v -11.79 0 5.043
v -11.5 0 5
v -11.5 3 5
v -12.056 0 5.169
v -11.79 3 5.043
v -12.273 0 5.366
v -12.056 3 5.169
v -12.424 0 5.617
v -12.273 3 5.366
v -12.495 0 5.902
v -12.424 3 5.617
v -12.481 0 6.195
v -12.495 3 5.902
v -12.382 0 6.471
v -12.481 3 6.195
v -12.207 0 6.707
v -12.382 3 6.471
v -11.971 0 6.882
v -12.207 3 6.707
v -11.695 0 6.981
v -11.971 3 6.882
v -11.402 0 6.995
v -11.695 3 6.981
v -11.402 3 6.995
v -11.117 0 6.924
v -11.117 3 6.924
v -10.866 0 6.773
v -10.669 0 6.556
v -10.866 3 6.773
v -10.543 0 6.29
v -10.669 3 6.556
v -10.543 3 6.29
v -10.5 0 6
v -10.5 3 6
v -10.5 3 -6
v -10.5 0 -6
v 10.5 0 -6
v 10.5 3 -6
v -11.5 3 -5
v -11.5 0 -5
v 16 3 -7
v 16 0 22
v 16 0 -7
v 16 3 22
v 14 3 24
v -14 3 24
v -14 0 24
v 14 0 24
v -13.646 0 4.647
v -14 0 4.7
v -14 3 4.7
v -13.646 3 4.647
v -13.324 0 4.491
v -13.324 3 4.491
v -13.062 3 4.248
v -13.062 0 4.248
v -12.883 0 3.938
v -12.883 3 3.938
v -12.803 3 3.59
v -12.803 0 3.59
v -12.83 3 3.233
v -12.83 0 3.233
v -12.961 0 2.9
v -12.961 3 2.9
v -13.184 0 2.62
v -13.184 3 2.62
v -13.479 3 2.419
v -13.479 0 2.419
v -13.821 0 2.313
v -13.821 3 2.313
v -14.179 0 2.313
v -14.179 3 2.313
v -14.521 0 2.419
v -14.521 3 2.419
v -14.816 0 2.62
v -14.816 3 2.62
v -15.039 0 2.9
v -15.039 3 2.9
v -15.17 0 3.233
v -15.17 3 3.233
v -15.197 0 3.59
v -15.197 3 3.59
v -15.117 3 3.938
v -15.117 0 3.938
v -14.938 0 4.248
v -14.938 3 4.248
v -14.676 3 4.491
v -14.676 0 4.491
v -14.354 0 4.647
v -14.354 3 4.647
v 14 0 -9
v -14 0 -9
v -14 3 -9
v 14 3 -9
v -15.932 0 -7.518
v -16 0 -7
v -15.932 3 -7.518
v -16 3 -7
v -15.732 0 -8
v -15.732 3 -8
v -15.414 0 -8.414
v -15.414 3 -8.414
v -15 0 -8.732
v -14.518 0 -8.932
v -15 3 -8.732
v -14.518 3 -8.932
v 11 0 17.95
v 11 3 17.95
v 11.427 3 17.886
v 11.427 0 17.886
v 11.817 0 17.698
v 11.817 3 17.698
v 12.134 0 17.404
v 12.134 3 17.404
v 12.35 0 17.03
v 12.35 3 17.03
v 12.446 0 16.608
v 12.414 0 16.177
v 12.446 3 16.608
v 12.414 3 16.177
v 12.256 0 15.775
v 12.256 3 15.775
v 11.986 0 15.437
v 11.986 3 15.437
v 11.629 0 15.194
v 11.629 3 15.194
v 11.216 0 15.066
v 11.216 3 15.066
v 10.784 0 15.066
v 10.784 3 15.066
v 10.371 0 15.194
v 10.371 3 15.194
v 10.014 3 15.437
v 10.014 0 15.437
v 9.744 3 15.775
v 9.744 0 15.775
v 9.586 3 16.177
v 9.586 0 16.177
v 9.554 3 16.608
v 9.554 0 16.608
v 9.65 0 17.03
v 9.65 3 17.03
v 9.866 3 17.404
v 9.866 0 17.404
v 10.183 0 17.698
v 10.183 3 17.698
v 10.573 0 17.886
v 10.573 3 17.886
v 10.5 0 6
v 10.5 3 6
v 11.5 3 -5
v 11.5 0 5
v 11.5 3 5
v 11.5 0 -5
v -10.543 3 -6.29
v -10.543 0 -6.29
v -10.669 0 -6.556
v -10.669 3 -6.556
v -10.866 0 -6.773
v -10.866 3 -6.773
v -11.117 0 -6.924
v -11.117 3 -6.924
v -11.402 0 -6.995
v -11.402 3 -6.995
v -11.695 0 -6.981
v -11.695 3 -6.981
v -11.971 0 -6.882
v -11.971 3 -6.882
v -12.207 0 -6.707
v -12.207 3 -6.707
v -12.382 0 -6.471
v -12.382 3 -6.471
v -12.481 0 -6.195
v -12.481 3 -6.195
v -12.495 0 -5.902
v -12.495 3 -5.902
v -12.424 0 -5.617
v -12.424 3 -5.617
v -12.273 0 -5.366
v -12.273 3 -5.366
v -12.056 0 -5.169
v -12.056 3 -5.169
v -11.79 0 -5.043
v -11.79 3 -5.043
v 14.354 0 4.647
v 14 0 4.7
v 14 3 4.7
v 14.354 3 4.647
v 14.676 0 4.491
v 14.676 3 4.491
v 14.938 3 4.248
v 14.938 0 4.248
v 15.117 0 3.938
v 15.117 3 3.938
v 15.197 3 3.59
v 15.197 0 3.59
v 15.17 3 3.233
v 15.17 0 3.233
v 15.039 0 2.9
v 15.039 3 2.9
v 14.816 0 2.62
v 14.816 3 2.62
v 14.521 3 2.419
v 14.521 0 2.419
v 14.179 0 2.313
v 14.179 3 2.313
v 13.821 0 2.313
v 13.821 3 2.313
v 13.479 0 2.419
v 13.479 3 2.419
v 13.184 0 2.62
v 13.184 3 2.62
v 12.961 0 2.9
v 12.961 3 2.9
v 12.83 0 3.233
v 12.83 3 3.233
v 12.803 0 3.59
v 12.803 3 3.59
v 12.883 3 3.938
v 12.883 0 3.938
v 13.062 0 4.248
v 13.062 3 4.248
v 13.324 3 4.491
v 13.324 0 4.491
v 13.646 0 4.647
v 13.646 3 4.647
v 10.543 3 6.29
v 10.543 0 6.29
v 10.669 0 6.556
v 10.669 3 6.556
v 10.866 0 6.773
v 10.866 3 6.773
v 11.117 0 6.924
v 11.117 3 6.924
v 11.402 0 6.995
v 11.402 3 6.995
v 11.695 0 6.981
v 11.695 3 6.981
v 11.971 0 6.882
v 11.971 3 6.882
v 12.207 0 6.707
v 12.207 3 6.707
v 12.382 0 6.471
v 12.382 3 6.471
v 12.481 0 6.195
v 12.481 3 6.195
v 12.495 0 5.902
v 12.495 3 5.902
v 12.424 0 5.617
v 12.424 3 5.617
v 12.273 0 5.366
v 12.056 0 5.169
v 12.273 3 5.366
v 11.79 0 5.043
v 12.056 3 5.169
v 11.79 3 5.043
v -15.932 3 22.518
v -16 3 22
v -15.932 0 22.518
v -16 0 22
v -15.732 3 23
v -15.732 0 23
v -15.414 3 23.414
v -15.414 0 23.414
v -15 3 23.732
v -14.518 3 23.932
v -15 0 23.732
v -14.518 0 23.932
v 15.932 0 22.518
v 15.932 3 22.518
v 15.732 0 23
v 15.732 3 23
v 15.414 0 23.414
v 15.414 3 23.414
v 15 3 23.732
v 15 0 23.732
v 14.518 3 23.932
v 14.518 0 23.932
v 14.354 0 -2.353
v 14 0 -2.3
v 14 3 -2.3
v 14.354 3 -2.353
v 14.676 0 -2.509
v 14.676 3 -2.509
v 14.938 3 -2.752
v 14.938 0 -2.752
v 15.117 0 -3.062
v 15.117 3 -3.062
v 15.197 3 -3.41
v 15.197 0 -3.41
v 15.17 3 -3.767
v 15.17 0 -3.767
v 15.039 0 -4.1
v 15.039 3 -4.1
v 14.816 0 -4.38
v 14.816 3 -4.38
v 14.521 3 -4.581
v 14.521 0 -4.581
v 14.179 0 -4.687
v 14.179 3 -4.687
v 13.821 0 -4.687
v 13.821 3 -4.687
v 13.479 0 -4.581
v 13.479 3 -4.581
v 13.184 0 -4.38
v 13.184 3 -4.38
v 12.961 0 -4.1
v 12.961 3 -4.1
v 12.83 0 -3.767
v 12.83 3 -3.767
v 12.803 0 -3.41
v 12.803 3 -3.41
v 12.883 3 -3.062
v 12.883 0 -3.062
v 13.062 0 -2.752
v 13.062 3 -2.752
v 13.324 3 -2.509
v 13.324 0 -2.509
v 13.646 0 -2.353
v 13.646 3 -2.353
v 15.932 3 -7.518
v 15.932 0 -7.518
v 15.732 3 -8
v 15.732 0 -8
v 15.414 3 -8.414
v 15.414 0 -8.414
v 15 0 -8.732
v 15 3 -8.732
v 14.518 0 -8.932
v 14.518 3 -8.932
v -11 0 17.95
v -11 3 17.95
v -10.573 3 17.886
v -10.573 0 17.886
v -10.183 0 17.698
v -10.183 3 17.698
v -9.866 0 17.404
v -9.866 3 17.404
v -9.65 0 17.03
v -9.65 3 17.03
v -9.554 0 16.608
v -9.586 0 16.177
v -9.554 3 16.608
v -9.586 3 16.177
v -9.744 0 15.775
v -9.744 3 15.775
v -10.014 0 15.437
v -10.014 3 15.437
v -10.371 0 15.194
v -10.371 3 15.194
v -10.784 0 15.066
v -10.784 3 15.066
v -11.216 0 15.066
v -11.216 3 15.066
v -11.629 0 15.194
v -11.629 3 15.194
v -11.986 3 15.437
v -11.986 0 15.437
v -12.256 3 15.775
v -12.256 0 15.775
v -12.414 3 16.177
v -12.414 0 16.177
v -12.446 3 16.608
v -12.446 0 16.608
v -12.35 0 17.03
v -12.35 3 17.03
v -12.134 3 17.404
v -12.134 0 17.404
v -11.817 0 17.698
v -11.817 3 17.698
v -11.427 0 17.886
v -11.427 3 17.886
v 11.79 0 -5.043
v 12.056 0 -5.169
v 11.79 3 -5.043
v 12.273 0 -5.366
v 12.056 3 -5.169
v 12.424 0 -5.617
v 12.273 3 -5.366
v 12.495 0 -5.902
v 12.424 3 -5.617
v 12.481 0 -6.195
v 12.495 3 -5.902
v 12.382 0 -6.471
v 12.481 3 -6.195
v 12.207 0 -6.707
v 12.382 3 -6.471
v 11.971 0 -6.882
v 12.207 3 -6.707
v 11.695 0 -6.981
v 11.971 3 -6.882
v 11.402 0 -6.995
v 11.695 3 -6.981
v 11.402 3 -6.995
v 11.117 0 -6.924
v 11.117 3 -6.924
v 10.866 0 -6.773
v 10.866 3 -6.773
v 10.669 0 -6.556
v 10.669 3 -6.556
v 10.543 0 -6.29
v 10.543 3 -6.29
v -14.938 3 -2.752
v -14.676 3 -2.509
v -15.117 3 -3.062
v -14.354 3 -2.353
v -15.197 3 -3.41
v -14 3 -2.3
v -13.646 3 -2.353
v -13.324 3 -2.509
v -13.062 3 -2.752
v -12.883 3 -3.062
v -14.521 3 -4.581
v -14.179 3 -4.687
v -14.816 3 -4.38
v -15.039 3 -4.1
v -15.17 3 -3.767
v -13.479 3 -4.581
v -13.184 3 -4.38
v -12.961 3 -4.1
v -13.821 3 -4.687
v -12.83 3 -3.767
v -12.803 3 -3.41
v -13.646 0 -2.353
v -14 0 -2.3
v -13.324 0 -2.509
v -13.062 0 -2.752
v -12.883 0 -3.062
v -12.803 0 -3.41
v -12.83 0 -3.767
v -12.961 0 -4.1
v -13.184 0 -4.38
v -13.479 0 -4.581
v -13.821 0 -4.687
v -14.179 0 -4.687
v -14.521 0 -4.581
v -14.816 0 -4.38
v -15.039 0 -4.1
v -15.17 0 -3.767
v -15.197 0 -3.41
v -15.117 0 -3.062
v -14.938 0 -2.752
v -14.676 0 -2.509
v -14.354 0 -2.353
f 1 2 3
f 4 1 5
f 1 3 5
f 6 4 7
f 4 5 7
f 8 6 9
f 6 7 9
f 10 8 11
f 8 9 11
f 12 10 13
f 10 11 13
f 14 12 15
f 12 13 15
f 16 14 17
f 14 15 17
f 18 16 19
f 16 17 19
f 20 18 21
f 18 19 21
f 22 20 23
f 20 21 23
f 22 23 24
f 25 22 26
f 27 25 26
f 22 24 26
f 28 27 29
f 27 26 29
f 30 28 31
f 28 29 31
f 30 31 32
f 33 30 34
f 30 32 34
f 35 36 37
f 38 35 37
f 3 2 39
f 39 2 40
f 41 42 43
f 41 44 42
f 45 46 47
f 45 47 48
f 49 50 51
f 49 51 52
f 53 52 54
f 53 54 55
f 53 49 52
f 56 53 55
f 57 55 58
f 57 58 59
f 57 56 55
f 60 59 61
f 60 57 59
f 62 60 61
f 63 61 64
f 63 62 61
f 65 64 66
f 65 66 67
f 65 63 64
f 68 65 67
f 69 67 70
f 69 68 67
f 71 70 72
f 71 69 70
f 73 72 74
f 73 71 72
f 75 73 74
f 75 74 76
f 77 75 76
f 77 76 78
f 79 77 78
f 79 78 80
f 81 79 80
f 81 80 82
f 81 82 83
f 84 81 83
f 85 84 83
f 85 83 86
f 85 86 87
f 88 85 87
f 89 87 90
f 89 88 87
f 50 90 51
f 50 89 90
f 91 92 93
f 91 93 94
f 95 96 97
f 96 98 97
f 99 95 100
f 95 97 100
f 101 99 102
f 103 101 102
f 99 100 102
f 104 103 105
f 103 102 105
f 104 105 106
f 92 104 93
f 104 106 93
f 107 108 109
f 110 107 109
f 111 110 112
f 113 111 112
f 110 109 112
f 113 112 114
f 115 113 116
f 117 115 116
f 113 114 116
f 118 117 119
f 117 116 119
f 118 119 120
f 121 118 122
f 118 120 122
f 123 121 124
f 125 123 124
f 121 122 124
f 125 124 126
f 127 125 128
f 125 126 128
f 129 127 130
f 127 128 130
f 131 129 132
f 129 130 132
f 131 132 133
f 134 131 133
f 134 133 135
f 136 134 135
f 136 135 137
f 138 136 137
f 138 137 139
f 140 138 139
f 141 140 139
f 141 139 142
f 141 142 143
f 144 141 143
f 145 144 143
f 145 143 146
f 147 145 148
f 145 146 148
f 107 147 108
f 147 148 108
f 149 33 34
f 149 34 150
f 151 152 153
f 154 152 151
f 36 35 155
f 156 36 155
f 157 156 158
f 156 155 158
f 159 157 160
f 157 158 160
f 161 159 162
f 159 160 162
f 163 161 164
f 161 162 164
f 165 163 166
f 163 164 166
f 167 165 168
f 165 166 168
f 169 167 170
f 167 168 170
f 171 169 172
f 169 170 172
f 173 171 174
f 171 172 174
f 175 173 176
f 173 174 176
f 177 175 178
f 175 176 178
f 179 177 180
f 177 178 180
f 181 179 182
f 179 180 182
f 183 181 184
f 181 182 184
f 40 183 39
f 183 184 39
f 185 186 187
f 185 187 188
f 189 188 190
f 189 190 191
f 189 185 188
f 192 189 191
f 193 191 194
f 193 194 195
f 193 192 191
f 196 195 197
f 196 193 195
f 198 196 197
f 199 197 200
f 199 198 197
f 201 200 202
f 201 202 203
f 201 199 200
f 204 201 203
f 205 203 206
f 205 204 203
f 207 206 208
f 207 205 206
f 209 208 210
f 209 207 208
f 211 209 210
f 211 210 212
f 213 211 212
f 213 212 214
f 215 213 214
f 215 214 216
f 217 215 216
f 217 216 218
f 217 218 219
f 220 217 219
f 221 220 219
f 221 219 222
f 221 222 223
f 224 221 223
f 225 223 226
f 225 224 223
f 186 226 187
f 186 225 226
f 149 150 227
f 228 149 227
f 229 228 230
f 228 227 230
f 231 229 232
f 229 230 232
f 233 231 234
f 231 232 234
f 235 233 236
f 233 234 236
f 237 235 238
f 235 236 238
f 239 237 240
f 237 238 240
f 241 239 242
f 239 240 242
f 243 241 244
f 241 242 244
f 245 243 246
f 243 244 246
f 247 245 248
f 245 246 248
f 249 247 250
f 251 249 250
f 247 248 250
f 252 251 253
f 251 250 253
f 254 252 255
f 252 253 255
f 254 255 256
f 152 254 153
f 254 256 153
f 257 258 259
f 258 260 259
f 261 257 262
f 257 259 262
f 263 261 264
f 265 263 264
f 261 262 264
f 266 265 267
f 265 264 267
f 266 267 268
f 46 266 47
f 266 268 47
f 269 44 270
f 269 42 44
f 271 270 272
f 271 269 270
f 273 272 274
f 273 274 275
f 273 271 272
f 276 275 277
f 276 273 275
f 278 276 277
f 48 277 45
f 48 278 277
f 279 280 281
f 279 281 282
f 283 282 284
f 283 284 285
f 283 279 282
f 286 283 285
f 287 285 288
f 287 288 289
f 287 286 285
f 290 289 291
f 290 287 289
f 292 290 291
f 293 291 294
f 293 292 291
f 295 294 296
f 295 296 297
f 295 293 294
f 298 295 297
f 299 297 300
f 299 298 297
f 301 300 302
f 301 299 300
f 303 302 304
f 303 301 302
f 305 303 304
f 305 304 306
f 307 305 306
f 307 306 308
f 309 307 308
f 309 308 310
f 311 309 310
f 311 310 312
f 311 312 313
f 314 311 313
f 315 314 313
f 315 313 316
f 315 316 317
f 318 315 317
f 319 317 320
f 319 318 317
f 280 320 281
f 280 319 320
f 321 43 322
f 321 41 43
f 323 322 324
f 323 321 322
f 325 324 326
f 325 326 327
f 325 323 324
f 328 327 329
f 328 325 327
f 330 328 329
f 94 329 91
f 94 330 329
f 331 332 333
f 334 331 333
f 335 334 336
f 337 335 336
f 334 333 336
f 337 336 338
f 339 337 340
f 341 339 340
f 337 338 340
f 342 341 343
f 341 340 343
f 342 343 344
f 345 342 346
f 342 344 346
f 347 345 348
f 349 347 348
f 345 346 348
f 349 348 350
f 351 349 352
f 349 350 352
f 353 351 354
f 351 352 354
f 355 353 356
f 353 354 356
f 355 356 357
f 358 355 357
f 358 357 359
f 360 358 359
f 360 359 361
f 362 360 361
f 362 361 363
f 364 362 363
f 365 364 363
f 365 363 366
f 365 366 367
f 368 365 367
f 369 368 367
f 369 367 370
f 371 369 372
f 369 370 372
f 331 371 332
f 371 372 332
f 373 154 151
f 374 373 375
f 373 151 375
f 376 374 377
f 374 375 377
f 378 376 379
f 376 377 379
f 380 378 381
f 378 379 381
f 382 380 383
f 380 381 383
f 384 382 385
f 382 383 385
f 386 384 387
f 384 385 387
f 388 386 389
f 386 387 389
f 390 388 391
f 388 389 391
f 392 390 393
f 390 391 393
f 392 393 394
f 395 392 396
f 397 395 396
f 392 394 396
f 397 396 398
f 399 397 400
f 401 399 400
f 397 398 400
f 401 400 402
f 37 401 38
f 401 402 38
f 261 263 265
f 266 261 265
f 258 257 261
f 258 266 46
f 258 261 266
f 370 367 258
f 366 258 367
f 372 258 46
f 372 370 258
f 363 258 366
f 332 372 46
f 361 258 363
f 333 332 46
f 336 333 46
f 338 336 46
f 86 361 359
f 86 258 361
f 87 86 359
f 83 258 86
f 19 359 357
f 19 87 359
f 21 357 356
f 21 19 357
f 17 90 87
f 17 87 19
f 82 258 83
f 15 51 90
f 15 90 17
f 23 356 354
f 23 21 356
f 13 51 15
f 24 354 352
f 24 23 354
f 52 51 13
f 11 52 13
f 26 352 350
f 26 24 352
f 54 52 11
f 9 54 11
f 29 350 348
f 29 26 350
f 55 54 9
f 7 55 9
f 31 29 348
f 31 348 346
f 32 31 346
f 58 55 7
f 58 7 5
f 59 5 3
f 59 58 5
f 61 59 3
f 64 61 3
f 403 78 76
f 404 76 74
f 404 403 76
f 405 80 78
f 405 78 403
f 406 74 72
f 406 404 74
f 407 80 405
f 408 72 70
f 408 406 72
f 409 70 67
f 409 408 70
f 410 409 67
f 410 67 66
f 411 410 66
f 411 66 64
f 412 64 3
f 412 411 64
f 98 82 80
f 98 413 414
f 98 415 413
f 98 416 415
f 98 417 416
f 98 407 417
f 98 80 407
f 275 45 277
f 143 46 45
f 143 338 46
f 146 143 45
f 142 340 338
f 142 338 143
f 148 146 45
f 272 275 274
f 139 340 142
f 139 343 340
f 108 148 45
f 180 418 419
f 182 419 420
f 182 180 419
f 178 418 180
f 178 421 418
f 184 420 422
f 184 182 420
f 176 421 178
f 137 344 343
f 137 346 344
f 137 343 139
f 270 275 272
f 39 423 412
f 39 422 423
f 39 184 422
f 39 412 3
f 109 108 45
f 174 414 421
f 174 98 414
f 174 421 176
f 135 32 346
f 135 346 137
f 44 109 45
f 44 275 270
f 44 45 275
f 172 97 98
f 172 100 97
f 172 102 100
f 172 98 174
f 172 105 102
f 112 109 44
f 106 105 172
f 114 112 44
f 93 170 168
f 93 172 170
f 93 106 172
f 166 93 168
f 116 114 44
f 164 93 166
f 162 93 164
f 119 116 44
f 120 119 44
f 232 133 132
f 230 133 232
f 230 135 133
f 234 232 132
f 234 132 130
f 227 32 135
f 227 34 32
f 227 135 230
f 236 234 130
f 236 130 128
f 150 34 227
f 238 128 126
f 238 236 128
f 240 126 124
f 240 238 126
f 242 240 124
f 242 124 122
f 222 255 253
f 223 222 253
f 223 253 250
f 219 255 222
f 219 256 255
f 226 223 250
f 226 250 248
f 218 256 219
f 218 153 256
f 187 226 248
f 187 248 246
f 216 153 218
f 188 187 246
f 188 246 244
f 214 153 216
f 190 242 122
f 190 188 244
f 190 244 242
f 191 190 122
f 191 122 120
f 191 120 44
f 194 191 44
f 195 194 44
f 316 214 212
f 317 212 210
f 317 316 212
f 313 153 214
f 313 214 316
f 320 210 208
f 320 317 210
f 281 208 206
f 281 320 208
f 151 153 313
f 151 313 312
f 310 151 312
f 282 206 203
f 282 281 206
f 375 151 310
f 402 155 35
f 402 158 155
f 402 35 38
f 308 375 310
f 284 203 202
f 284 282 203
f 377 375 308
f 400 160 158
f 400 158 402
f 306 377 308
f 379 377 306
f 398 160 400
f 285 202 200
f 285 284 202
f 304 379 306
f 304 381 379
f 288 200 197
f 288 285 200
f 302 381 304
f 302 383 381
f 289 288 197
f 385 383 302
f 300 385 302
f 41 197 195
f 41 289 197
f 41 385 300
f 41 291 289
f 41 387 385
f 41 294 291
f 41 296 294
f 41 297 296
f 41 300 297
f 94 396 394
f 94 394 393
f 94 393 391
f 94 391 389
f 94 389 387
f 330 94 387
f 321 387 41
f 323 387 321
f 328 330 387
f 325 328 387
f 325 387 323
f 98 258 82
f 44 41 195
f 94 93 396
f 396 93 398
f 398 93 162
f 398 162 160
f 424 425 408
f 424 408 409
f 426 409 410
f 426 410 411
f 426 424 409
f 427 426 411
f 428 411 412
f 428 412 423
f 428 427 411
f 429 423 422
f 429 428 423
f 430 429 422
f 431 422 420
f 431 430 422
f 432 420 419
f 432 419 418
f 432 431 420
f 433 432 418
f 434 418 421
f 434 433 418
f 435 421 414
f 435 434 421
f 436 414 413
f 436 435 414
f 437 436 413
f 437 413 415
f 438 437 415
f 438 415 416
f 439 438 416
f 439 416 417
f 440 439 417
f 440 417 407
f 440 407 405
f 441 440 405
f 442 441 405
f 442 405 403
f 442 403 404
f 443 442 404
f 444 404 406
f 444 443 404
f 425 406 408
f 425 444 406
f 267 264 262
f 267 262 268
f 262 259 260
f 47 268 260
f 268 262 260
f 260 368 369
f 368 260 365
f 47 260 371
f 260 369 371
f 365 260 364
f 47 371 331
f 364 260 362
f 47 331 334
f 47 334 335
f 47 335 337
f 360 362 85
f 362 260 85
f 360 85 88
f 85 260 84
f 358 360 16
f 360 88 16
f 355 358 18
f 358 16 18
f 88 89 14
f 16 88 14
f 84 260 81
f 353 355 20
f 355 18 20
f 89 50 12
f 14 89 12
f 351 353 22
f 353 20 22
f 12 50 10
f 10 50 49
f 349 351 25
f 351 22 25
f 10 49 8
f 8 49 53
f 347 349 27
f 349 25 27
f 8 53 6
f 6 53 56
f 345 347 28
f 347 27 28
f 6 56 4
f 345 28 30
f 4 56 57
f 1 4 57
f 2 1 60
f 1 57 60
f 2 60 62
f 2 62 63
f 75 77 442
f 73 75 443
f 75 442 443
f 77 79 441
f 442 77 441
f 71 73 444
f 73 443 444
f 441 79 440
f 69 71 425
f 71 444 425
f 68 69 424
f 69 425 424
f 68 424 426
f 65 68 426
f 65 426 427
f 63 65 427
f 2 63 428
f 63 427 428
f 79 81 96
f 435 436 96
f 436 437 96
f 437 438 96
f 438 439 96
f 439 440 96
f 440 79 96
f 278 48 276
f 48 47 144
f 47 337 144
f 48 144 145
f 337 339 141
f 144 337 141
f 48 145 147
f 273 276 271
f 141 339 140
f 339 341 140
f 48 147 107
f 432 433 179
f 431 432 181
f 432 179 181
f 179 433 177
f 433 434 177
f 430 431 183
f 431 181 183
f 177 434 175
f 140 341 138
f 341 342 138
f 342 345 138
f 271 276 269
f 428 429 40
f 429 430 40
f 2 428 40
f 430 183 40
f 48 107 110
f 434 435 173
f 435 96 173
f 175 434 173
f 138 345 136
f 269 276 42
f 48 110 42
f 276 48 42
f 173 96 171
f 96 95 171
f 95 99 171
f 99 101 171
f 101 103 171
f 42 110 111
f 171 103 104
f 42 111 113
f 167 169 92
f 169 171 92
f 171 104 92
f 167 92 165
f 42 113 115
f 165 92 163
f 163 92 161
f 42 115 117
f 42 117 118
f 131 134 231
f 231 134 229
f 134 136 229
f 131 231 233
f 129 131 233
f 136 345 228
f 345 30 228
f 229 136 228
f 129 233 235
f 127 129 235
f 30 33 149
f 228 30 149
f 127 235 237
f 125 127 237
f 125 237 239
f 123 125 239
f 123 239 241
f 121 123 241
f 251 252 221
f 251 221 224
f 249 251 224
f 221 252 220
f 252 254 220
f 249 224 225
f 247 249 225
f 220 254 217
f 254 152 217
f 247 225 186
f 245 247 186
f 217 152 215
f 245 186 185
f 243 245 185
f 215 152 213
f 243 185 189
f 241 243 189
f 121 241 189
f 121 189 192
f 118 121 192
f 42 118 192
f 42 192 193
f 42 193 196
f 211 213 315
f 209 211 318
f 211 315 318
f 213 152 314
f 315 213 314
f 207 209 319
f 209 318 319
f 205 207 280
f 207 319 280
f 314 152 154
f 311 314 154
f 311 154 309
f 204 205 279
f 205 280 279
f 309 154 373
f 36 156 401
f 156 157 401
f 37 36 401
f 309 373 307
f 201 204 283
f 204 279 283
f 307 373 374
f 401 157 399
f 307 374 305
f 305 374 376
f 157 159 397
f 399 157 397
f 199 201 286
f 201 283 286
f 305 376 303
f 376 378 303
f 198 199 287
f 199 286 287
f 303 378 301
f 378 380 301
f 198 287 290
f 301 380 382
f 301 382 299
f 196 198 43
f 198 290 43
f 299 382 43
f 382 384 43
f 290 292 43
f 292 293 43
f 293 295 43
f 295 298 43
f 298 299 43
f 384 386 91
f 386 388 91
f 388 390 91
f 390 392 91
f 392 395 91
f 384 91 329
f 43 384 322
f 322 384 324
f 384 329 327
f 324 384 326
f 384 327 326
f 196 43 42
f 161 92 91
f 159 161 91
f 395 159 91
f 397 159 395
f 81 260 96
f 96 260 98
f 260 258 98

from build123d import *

# Parameters (mm, degrees)
SKETCH_1_W          = 32
SKETCH_1_H          = 18
SKETCH_1_R          = 1.2
SKETCH_1_W_2        = 23
SKETCH_1_H_2        = 12
EXTRUDE_1_DEPTH     = 3
CUT_EXTRUDE_1_REACH = 20.601
SKETCH_2_R          = 1
SKETCH_4_W          = 32
SKETCH_4_H          = 15
SKETCH_4_R          = 1.45
EXTRUDE_2_DEPTH     = 3
FILLET_1_R          = 2


with BuildPart() as part:
    # 草图1 → 凸台-拉伸1 (new body)
    with BuildSketch(Plane(origin=(0, 0, 0), x_dir=(1, 0, 0), z_dir=(0, 1, 0))):
        Rectangle(SKETCH_1_W, SKETCH_1_H)
        with Locations(Location((-14, 3.5, 0), (0, 0, 270))):
            Circle(SKETCH_1_R, mode=Mode.SUBTRACT)
        with Locations(Location((-14, -3.5, 0), (0, 0, 270))):
            Circle(SKETCH_1_R, mode=Mode.SUBTRACT)
        with Locations(Location((14, 3.5, 0), (0, 0, 270))):
            Circle(SKETCH_1_R, mode=Mode.SUBTRACT)
        with Locations(Location((14, -3.5, 0), (0, 0, 270))):
            Circle(SKETCH_1_R, mode=Mode.SUBTRACT)
        Rectangle(SKETCH_1_W_2, SKETCH_1_H_2, mode=Mode.SUBTRACT)
    extrude(amount=EXTRUDE_1_DEPTH)

    # 草图2 → 切除-拉伸1 (cut, up to next)
    with BuildSketch(Plane(origin=(0, 3, 0), x_dir=(1, 0, 0), z_dir=(0, 1, 0)), mode=Mode.PRIVATE) as cut_extrude_1_sk1:
        with Locations((-11.5, 6)):
            Circle(SKETCH_2_R)
    cut_extrude_1_tool1 = extrude(cut_extrude_1_sk1.sketch, amount=-CUT_EXTRUDE_1_REACH, mode=Mode.PRIVATE) & part.part
    # 草图2 → 切除-拉伸1 (cut, up to next)
    with BuildSketch(Plane(origin=(0, 3, 0), x_dir=(1, 0, 0), z_dir=(0, 1, 0)), mode=Mode.PRIVATE) as cut_extrude_1_sk2:
        with Locations((-11.5, -6)):
            Circle(SKETCH_2_R)
    cut_extrude_1_tool2 = extrude(cut_extrude_1_sk2.sketch, amount=-CUT_EXTRUDE_1_REACH, mode=Mode.PRIVATE) & part.part
    # 草图2 → 切除-拉伸1 (cut, up to next)
    with BuildSketch(Plane(origin=(0, 3, 0), x_dir=(1, 0, 0), z_dir=(0, 1, 0)), mode=Mode.PRIVATE) as cut_extrude_1_sk3:
        with Locations((11.5, -6)):
            Circle(SKETCH_2_R)
    cut_extrude_1_tool3 = extrude(cut_extrude_1_sk3.sketch, amount=-CUT_EXTRUDE_1_REACH, mode=Mode.PRIVATE) & part.part
    # 草图2 → 切除-拉伸1 (cut, up to next)
    with BuildSketch(Plane(origin=(0, 3, 0), x_dir=(1, 0, 0), z_dir=(0, 1, 0)), mode=Mode.PRIVATE) as cut_extrude_1_sk4:
        with Locations((11.5, 6)):
            Circle(SKETCH_2_R)
    cut_extrude_1_tool4 = extrude(cut_extrude_1_sk4.sketch, amount=-CUT_EXTRUDE_1_REACH, mode=Mode.PRIVATE) & part.part
    add(cut_extrude_1_tool1.solids().sort_by_distance((-11.5, 3, -6))[0], mode=Mode.SUBTRACT)
    add(cut_extrude_1_tool2.solids().sort_by_distance((-11.5, 3, 6))[0], mode=Mode.SUBTRACT)
    add(cut_extrude_1_tool3.solids().sort_by_distance((11.5, 3, 6))[0], mode=Mode.SUBTRACT)
    add(cut_extrude_1_tool4.solids().sort_by_distance((11.5, 3, -6))[0], mode=Mode.SUBTRACT)

    # 草图4 → 凸台-拉伸2 (add)
    with BuildSketch(Plane(origin=(0, 3, 0), x_dir=(1, 0, 0), z_dir=(0, 1, 0))):
        with Locations((0, -16.5)):
            Rectangle(SKETCH_4_W, SKETCH_4_H)
        with Locations(Location((-11, -16.5, 0), (0, 0, 270))):
            Circle(SKETCH_4_R, mode=Mode.SUBTRACT)
        with Locations(Location((11, -16.5, 0), (0, 0, 270))):
            Circle(SKETCH_4_R, mode=Mode.SUBTRACT)
    extrude(amount=-EXTRUDE_2_DEPTH)

    # 圆角1
    fillet_1_edges = [part.edges().sort_by_distance(p)[0] for p in [
        (-16, 1.5, -9),
        (16, 1.5, -9),
        (-16, 1.5, 24),
        (16, 1.5, 24),
    ]]
    fillet(fillet_1_edges, radius=FILLET_1_R)


solid = part.part
